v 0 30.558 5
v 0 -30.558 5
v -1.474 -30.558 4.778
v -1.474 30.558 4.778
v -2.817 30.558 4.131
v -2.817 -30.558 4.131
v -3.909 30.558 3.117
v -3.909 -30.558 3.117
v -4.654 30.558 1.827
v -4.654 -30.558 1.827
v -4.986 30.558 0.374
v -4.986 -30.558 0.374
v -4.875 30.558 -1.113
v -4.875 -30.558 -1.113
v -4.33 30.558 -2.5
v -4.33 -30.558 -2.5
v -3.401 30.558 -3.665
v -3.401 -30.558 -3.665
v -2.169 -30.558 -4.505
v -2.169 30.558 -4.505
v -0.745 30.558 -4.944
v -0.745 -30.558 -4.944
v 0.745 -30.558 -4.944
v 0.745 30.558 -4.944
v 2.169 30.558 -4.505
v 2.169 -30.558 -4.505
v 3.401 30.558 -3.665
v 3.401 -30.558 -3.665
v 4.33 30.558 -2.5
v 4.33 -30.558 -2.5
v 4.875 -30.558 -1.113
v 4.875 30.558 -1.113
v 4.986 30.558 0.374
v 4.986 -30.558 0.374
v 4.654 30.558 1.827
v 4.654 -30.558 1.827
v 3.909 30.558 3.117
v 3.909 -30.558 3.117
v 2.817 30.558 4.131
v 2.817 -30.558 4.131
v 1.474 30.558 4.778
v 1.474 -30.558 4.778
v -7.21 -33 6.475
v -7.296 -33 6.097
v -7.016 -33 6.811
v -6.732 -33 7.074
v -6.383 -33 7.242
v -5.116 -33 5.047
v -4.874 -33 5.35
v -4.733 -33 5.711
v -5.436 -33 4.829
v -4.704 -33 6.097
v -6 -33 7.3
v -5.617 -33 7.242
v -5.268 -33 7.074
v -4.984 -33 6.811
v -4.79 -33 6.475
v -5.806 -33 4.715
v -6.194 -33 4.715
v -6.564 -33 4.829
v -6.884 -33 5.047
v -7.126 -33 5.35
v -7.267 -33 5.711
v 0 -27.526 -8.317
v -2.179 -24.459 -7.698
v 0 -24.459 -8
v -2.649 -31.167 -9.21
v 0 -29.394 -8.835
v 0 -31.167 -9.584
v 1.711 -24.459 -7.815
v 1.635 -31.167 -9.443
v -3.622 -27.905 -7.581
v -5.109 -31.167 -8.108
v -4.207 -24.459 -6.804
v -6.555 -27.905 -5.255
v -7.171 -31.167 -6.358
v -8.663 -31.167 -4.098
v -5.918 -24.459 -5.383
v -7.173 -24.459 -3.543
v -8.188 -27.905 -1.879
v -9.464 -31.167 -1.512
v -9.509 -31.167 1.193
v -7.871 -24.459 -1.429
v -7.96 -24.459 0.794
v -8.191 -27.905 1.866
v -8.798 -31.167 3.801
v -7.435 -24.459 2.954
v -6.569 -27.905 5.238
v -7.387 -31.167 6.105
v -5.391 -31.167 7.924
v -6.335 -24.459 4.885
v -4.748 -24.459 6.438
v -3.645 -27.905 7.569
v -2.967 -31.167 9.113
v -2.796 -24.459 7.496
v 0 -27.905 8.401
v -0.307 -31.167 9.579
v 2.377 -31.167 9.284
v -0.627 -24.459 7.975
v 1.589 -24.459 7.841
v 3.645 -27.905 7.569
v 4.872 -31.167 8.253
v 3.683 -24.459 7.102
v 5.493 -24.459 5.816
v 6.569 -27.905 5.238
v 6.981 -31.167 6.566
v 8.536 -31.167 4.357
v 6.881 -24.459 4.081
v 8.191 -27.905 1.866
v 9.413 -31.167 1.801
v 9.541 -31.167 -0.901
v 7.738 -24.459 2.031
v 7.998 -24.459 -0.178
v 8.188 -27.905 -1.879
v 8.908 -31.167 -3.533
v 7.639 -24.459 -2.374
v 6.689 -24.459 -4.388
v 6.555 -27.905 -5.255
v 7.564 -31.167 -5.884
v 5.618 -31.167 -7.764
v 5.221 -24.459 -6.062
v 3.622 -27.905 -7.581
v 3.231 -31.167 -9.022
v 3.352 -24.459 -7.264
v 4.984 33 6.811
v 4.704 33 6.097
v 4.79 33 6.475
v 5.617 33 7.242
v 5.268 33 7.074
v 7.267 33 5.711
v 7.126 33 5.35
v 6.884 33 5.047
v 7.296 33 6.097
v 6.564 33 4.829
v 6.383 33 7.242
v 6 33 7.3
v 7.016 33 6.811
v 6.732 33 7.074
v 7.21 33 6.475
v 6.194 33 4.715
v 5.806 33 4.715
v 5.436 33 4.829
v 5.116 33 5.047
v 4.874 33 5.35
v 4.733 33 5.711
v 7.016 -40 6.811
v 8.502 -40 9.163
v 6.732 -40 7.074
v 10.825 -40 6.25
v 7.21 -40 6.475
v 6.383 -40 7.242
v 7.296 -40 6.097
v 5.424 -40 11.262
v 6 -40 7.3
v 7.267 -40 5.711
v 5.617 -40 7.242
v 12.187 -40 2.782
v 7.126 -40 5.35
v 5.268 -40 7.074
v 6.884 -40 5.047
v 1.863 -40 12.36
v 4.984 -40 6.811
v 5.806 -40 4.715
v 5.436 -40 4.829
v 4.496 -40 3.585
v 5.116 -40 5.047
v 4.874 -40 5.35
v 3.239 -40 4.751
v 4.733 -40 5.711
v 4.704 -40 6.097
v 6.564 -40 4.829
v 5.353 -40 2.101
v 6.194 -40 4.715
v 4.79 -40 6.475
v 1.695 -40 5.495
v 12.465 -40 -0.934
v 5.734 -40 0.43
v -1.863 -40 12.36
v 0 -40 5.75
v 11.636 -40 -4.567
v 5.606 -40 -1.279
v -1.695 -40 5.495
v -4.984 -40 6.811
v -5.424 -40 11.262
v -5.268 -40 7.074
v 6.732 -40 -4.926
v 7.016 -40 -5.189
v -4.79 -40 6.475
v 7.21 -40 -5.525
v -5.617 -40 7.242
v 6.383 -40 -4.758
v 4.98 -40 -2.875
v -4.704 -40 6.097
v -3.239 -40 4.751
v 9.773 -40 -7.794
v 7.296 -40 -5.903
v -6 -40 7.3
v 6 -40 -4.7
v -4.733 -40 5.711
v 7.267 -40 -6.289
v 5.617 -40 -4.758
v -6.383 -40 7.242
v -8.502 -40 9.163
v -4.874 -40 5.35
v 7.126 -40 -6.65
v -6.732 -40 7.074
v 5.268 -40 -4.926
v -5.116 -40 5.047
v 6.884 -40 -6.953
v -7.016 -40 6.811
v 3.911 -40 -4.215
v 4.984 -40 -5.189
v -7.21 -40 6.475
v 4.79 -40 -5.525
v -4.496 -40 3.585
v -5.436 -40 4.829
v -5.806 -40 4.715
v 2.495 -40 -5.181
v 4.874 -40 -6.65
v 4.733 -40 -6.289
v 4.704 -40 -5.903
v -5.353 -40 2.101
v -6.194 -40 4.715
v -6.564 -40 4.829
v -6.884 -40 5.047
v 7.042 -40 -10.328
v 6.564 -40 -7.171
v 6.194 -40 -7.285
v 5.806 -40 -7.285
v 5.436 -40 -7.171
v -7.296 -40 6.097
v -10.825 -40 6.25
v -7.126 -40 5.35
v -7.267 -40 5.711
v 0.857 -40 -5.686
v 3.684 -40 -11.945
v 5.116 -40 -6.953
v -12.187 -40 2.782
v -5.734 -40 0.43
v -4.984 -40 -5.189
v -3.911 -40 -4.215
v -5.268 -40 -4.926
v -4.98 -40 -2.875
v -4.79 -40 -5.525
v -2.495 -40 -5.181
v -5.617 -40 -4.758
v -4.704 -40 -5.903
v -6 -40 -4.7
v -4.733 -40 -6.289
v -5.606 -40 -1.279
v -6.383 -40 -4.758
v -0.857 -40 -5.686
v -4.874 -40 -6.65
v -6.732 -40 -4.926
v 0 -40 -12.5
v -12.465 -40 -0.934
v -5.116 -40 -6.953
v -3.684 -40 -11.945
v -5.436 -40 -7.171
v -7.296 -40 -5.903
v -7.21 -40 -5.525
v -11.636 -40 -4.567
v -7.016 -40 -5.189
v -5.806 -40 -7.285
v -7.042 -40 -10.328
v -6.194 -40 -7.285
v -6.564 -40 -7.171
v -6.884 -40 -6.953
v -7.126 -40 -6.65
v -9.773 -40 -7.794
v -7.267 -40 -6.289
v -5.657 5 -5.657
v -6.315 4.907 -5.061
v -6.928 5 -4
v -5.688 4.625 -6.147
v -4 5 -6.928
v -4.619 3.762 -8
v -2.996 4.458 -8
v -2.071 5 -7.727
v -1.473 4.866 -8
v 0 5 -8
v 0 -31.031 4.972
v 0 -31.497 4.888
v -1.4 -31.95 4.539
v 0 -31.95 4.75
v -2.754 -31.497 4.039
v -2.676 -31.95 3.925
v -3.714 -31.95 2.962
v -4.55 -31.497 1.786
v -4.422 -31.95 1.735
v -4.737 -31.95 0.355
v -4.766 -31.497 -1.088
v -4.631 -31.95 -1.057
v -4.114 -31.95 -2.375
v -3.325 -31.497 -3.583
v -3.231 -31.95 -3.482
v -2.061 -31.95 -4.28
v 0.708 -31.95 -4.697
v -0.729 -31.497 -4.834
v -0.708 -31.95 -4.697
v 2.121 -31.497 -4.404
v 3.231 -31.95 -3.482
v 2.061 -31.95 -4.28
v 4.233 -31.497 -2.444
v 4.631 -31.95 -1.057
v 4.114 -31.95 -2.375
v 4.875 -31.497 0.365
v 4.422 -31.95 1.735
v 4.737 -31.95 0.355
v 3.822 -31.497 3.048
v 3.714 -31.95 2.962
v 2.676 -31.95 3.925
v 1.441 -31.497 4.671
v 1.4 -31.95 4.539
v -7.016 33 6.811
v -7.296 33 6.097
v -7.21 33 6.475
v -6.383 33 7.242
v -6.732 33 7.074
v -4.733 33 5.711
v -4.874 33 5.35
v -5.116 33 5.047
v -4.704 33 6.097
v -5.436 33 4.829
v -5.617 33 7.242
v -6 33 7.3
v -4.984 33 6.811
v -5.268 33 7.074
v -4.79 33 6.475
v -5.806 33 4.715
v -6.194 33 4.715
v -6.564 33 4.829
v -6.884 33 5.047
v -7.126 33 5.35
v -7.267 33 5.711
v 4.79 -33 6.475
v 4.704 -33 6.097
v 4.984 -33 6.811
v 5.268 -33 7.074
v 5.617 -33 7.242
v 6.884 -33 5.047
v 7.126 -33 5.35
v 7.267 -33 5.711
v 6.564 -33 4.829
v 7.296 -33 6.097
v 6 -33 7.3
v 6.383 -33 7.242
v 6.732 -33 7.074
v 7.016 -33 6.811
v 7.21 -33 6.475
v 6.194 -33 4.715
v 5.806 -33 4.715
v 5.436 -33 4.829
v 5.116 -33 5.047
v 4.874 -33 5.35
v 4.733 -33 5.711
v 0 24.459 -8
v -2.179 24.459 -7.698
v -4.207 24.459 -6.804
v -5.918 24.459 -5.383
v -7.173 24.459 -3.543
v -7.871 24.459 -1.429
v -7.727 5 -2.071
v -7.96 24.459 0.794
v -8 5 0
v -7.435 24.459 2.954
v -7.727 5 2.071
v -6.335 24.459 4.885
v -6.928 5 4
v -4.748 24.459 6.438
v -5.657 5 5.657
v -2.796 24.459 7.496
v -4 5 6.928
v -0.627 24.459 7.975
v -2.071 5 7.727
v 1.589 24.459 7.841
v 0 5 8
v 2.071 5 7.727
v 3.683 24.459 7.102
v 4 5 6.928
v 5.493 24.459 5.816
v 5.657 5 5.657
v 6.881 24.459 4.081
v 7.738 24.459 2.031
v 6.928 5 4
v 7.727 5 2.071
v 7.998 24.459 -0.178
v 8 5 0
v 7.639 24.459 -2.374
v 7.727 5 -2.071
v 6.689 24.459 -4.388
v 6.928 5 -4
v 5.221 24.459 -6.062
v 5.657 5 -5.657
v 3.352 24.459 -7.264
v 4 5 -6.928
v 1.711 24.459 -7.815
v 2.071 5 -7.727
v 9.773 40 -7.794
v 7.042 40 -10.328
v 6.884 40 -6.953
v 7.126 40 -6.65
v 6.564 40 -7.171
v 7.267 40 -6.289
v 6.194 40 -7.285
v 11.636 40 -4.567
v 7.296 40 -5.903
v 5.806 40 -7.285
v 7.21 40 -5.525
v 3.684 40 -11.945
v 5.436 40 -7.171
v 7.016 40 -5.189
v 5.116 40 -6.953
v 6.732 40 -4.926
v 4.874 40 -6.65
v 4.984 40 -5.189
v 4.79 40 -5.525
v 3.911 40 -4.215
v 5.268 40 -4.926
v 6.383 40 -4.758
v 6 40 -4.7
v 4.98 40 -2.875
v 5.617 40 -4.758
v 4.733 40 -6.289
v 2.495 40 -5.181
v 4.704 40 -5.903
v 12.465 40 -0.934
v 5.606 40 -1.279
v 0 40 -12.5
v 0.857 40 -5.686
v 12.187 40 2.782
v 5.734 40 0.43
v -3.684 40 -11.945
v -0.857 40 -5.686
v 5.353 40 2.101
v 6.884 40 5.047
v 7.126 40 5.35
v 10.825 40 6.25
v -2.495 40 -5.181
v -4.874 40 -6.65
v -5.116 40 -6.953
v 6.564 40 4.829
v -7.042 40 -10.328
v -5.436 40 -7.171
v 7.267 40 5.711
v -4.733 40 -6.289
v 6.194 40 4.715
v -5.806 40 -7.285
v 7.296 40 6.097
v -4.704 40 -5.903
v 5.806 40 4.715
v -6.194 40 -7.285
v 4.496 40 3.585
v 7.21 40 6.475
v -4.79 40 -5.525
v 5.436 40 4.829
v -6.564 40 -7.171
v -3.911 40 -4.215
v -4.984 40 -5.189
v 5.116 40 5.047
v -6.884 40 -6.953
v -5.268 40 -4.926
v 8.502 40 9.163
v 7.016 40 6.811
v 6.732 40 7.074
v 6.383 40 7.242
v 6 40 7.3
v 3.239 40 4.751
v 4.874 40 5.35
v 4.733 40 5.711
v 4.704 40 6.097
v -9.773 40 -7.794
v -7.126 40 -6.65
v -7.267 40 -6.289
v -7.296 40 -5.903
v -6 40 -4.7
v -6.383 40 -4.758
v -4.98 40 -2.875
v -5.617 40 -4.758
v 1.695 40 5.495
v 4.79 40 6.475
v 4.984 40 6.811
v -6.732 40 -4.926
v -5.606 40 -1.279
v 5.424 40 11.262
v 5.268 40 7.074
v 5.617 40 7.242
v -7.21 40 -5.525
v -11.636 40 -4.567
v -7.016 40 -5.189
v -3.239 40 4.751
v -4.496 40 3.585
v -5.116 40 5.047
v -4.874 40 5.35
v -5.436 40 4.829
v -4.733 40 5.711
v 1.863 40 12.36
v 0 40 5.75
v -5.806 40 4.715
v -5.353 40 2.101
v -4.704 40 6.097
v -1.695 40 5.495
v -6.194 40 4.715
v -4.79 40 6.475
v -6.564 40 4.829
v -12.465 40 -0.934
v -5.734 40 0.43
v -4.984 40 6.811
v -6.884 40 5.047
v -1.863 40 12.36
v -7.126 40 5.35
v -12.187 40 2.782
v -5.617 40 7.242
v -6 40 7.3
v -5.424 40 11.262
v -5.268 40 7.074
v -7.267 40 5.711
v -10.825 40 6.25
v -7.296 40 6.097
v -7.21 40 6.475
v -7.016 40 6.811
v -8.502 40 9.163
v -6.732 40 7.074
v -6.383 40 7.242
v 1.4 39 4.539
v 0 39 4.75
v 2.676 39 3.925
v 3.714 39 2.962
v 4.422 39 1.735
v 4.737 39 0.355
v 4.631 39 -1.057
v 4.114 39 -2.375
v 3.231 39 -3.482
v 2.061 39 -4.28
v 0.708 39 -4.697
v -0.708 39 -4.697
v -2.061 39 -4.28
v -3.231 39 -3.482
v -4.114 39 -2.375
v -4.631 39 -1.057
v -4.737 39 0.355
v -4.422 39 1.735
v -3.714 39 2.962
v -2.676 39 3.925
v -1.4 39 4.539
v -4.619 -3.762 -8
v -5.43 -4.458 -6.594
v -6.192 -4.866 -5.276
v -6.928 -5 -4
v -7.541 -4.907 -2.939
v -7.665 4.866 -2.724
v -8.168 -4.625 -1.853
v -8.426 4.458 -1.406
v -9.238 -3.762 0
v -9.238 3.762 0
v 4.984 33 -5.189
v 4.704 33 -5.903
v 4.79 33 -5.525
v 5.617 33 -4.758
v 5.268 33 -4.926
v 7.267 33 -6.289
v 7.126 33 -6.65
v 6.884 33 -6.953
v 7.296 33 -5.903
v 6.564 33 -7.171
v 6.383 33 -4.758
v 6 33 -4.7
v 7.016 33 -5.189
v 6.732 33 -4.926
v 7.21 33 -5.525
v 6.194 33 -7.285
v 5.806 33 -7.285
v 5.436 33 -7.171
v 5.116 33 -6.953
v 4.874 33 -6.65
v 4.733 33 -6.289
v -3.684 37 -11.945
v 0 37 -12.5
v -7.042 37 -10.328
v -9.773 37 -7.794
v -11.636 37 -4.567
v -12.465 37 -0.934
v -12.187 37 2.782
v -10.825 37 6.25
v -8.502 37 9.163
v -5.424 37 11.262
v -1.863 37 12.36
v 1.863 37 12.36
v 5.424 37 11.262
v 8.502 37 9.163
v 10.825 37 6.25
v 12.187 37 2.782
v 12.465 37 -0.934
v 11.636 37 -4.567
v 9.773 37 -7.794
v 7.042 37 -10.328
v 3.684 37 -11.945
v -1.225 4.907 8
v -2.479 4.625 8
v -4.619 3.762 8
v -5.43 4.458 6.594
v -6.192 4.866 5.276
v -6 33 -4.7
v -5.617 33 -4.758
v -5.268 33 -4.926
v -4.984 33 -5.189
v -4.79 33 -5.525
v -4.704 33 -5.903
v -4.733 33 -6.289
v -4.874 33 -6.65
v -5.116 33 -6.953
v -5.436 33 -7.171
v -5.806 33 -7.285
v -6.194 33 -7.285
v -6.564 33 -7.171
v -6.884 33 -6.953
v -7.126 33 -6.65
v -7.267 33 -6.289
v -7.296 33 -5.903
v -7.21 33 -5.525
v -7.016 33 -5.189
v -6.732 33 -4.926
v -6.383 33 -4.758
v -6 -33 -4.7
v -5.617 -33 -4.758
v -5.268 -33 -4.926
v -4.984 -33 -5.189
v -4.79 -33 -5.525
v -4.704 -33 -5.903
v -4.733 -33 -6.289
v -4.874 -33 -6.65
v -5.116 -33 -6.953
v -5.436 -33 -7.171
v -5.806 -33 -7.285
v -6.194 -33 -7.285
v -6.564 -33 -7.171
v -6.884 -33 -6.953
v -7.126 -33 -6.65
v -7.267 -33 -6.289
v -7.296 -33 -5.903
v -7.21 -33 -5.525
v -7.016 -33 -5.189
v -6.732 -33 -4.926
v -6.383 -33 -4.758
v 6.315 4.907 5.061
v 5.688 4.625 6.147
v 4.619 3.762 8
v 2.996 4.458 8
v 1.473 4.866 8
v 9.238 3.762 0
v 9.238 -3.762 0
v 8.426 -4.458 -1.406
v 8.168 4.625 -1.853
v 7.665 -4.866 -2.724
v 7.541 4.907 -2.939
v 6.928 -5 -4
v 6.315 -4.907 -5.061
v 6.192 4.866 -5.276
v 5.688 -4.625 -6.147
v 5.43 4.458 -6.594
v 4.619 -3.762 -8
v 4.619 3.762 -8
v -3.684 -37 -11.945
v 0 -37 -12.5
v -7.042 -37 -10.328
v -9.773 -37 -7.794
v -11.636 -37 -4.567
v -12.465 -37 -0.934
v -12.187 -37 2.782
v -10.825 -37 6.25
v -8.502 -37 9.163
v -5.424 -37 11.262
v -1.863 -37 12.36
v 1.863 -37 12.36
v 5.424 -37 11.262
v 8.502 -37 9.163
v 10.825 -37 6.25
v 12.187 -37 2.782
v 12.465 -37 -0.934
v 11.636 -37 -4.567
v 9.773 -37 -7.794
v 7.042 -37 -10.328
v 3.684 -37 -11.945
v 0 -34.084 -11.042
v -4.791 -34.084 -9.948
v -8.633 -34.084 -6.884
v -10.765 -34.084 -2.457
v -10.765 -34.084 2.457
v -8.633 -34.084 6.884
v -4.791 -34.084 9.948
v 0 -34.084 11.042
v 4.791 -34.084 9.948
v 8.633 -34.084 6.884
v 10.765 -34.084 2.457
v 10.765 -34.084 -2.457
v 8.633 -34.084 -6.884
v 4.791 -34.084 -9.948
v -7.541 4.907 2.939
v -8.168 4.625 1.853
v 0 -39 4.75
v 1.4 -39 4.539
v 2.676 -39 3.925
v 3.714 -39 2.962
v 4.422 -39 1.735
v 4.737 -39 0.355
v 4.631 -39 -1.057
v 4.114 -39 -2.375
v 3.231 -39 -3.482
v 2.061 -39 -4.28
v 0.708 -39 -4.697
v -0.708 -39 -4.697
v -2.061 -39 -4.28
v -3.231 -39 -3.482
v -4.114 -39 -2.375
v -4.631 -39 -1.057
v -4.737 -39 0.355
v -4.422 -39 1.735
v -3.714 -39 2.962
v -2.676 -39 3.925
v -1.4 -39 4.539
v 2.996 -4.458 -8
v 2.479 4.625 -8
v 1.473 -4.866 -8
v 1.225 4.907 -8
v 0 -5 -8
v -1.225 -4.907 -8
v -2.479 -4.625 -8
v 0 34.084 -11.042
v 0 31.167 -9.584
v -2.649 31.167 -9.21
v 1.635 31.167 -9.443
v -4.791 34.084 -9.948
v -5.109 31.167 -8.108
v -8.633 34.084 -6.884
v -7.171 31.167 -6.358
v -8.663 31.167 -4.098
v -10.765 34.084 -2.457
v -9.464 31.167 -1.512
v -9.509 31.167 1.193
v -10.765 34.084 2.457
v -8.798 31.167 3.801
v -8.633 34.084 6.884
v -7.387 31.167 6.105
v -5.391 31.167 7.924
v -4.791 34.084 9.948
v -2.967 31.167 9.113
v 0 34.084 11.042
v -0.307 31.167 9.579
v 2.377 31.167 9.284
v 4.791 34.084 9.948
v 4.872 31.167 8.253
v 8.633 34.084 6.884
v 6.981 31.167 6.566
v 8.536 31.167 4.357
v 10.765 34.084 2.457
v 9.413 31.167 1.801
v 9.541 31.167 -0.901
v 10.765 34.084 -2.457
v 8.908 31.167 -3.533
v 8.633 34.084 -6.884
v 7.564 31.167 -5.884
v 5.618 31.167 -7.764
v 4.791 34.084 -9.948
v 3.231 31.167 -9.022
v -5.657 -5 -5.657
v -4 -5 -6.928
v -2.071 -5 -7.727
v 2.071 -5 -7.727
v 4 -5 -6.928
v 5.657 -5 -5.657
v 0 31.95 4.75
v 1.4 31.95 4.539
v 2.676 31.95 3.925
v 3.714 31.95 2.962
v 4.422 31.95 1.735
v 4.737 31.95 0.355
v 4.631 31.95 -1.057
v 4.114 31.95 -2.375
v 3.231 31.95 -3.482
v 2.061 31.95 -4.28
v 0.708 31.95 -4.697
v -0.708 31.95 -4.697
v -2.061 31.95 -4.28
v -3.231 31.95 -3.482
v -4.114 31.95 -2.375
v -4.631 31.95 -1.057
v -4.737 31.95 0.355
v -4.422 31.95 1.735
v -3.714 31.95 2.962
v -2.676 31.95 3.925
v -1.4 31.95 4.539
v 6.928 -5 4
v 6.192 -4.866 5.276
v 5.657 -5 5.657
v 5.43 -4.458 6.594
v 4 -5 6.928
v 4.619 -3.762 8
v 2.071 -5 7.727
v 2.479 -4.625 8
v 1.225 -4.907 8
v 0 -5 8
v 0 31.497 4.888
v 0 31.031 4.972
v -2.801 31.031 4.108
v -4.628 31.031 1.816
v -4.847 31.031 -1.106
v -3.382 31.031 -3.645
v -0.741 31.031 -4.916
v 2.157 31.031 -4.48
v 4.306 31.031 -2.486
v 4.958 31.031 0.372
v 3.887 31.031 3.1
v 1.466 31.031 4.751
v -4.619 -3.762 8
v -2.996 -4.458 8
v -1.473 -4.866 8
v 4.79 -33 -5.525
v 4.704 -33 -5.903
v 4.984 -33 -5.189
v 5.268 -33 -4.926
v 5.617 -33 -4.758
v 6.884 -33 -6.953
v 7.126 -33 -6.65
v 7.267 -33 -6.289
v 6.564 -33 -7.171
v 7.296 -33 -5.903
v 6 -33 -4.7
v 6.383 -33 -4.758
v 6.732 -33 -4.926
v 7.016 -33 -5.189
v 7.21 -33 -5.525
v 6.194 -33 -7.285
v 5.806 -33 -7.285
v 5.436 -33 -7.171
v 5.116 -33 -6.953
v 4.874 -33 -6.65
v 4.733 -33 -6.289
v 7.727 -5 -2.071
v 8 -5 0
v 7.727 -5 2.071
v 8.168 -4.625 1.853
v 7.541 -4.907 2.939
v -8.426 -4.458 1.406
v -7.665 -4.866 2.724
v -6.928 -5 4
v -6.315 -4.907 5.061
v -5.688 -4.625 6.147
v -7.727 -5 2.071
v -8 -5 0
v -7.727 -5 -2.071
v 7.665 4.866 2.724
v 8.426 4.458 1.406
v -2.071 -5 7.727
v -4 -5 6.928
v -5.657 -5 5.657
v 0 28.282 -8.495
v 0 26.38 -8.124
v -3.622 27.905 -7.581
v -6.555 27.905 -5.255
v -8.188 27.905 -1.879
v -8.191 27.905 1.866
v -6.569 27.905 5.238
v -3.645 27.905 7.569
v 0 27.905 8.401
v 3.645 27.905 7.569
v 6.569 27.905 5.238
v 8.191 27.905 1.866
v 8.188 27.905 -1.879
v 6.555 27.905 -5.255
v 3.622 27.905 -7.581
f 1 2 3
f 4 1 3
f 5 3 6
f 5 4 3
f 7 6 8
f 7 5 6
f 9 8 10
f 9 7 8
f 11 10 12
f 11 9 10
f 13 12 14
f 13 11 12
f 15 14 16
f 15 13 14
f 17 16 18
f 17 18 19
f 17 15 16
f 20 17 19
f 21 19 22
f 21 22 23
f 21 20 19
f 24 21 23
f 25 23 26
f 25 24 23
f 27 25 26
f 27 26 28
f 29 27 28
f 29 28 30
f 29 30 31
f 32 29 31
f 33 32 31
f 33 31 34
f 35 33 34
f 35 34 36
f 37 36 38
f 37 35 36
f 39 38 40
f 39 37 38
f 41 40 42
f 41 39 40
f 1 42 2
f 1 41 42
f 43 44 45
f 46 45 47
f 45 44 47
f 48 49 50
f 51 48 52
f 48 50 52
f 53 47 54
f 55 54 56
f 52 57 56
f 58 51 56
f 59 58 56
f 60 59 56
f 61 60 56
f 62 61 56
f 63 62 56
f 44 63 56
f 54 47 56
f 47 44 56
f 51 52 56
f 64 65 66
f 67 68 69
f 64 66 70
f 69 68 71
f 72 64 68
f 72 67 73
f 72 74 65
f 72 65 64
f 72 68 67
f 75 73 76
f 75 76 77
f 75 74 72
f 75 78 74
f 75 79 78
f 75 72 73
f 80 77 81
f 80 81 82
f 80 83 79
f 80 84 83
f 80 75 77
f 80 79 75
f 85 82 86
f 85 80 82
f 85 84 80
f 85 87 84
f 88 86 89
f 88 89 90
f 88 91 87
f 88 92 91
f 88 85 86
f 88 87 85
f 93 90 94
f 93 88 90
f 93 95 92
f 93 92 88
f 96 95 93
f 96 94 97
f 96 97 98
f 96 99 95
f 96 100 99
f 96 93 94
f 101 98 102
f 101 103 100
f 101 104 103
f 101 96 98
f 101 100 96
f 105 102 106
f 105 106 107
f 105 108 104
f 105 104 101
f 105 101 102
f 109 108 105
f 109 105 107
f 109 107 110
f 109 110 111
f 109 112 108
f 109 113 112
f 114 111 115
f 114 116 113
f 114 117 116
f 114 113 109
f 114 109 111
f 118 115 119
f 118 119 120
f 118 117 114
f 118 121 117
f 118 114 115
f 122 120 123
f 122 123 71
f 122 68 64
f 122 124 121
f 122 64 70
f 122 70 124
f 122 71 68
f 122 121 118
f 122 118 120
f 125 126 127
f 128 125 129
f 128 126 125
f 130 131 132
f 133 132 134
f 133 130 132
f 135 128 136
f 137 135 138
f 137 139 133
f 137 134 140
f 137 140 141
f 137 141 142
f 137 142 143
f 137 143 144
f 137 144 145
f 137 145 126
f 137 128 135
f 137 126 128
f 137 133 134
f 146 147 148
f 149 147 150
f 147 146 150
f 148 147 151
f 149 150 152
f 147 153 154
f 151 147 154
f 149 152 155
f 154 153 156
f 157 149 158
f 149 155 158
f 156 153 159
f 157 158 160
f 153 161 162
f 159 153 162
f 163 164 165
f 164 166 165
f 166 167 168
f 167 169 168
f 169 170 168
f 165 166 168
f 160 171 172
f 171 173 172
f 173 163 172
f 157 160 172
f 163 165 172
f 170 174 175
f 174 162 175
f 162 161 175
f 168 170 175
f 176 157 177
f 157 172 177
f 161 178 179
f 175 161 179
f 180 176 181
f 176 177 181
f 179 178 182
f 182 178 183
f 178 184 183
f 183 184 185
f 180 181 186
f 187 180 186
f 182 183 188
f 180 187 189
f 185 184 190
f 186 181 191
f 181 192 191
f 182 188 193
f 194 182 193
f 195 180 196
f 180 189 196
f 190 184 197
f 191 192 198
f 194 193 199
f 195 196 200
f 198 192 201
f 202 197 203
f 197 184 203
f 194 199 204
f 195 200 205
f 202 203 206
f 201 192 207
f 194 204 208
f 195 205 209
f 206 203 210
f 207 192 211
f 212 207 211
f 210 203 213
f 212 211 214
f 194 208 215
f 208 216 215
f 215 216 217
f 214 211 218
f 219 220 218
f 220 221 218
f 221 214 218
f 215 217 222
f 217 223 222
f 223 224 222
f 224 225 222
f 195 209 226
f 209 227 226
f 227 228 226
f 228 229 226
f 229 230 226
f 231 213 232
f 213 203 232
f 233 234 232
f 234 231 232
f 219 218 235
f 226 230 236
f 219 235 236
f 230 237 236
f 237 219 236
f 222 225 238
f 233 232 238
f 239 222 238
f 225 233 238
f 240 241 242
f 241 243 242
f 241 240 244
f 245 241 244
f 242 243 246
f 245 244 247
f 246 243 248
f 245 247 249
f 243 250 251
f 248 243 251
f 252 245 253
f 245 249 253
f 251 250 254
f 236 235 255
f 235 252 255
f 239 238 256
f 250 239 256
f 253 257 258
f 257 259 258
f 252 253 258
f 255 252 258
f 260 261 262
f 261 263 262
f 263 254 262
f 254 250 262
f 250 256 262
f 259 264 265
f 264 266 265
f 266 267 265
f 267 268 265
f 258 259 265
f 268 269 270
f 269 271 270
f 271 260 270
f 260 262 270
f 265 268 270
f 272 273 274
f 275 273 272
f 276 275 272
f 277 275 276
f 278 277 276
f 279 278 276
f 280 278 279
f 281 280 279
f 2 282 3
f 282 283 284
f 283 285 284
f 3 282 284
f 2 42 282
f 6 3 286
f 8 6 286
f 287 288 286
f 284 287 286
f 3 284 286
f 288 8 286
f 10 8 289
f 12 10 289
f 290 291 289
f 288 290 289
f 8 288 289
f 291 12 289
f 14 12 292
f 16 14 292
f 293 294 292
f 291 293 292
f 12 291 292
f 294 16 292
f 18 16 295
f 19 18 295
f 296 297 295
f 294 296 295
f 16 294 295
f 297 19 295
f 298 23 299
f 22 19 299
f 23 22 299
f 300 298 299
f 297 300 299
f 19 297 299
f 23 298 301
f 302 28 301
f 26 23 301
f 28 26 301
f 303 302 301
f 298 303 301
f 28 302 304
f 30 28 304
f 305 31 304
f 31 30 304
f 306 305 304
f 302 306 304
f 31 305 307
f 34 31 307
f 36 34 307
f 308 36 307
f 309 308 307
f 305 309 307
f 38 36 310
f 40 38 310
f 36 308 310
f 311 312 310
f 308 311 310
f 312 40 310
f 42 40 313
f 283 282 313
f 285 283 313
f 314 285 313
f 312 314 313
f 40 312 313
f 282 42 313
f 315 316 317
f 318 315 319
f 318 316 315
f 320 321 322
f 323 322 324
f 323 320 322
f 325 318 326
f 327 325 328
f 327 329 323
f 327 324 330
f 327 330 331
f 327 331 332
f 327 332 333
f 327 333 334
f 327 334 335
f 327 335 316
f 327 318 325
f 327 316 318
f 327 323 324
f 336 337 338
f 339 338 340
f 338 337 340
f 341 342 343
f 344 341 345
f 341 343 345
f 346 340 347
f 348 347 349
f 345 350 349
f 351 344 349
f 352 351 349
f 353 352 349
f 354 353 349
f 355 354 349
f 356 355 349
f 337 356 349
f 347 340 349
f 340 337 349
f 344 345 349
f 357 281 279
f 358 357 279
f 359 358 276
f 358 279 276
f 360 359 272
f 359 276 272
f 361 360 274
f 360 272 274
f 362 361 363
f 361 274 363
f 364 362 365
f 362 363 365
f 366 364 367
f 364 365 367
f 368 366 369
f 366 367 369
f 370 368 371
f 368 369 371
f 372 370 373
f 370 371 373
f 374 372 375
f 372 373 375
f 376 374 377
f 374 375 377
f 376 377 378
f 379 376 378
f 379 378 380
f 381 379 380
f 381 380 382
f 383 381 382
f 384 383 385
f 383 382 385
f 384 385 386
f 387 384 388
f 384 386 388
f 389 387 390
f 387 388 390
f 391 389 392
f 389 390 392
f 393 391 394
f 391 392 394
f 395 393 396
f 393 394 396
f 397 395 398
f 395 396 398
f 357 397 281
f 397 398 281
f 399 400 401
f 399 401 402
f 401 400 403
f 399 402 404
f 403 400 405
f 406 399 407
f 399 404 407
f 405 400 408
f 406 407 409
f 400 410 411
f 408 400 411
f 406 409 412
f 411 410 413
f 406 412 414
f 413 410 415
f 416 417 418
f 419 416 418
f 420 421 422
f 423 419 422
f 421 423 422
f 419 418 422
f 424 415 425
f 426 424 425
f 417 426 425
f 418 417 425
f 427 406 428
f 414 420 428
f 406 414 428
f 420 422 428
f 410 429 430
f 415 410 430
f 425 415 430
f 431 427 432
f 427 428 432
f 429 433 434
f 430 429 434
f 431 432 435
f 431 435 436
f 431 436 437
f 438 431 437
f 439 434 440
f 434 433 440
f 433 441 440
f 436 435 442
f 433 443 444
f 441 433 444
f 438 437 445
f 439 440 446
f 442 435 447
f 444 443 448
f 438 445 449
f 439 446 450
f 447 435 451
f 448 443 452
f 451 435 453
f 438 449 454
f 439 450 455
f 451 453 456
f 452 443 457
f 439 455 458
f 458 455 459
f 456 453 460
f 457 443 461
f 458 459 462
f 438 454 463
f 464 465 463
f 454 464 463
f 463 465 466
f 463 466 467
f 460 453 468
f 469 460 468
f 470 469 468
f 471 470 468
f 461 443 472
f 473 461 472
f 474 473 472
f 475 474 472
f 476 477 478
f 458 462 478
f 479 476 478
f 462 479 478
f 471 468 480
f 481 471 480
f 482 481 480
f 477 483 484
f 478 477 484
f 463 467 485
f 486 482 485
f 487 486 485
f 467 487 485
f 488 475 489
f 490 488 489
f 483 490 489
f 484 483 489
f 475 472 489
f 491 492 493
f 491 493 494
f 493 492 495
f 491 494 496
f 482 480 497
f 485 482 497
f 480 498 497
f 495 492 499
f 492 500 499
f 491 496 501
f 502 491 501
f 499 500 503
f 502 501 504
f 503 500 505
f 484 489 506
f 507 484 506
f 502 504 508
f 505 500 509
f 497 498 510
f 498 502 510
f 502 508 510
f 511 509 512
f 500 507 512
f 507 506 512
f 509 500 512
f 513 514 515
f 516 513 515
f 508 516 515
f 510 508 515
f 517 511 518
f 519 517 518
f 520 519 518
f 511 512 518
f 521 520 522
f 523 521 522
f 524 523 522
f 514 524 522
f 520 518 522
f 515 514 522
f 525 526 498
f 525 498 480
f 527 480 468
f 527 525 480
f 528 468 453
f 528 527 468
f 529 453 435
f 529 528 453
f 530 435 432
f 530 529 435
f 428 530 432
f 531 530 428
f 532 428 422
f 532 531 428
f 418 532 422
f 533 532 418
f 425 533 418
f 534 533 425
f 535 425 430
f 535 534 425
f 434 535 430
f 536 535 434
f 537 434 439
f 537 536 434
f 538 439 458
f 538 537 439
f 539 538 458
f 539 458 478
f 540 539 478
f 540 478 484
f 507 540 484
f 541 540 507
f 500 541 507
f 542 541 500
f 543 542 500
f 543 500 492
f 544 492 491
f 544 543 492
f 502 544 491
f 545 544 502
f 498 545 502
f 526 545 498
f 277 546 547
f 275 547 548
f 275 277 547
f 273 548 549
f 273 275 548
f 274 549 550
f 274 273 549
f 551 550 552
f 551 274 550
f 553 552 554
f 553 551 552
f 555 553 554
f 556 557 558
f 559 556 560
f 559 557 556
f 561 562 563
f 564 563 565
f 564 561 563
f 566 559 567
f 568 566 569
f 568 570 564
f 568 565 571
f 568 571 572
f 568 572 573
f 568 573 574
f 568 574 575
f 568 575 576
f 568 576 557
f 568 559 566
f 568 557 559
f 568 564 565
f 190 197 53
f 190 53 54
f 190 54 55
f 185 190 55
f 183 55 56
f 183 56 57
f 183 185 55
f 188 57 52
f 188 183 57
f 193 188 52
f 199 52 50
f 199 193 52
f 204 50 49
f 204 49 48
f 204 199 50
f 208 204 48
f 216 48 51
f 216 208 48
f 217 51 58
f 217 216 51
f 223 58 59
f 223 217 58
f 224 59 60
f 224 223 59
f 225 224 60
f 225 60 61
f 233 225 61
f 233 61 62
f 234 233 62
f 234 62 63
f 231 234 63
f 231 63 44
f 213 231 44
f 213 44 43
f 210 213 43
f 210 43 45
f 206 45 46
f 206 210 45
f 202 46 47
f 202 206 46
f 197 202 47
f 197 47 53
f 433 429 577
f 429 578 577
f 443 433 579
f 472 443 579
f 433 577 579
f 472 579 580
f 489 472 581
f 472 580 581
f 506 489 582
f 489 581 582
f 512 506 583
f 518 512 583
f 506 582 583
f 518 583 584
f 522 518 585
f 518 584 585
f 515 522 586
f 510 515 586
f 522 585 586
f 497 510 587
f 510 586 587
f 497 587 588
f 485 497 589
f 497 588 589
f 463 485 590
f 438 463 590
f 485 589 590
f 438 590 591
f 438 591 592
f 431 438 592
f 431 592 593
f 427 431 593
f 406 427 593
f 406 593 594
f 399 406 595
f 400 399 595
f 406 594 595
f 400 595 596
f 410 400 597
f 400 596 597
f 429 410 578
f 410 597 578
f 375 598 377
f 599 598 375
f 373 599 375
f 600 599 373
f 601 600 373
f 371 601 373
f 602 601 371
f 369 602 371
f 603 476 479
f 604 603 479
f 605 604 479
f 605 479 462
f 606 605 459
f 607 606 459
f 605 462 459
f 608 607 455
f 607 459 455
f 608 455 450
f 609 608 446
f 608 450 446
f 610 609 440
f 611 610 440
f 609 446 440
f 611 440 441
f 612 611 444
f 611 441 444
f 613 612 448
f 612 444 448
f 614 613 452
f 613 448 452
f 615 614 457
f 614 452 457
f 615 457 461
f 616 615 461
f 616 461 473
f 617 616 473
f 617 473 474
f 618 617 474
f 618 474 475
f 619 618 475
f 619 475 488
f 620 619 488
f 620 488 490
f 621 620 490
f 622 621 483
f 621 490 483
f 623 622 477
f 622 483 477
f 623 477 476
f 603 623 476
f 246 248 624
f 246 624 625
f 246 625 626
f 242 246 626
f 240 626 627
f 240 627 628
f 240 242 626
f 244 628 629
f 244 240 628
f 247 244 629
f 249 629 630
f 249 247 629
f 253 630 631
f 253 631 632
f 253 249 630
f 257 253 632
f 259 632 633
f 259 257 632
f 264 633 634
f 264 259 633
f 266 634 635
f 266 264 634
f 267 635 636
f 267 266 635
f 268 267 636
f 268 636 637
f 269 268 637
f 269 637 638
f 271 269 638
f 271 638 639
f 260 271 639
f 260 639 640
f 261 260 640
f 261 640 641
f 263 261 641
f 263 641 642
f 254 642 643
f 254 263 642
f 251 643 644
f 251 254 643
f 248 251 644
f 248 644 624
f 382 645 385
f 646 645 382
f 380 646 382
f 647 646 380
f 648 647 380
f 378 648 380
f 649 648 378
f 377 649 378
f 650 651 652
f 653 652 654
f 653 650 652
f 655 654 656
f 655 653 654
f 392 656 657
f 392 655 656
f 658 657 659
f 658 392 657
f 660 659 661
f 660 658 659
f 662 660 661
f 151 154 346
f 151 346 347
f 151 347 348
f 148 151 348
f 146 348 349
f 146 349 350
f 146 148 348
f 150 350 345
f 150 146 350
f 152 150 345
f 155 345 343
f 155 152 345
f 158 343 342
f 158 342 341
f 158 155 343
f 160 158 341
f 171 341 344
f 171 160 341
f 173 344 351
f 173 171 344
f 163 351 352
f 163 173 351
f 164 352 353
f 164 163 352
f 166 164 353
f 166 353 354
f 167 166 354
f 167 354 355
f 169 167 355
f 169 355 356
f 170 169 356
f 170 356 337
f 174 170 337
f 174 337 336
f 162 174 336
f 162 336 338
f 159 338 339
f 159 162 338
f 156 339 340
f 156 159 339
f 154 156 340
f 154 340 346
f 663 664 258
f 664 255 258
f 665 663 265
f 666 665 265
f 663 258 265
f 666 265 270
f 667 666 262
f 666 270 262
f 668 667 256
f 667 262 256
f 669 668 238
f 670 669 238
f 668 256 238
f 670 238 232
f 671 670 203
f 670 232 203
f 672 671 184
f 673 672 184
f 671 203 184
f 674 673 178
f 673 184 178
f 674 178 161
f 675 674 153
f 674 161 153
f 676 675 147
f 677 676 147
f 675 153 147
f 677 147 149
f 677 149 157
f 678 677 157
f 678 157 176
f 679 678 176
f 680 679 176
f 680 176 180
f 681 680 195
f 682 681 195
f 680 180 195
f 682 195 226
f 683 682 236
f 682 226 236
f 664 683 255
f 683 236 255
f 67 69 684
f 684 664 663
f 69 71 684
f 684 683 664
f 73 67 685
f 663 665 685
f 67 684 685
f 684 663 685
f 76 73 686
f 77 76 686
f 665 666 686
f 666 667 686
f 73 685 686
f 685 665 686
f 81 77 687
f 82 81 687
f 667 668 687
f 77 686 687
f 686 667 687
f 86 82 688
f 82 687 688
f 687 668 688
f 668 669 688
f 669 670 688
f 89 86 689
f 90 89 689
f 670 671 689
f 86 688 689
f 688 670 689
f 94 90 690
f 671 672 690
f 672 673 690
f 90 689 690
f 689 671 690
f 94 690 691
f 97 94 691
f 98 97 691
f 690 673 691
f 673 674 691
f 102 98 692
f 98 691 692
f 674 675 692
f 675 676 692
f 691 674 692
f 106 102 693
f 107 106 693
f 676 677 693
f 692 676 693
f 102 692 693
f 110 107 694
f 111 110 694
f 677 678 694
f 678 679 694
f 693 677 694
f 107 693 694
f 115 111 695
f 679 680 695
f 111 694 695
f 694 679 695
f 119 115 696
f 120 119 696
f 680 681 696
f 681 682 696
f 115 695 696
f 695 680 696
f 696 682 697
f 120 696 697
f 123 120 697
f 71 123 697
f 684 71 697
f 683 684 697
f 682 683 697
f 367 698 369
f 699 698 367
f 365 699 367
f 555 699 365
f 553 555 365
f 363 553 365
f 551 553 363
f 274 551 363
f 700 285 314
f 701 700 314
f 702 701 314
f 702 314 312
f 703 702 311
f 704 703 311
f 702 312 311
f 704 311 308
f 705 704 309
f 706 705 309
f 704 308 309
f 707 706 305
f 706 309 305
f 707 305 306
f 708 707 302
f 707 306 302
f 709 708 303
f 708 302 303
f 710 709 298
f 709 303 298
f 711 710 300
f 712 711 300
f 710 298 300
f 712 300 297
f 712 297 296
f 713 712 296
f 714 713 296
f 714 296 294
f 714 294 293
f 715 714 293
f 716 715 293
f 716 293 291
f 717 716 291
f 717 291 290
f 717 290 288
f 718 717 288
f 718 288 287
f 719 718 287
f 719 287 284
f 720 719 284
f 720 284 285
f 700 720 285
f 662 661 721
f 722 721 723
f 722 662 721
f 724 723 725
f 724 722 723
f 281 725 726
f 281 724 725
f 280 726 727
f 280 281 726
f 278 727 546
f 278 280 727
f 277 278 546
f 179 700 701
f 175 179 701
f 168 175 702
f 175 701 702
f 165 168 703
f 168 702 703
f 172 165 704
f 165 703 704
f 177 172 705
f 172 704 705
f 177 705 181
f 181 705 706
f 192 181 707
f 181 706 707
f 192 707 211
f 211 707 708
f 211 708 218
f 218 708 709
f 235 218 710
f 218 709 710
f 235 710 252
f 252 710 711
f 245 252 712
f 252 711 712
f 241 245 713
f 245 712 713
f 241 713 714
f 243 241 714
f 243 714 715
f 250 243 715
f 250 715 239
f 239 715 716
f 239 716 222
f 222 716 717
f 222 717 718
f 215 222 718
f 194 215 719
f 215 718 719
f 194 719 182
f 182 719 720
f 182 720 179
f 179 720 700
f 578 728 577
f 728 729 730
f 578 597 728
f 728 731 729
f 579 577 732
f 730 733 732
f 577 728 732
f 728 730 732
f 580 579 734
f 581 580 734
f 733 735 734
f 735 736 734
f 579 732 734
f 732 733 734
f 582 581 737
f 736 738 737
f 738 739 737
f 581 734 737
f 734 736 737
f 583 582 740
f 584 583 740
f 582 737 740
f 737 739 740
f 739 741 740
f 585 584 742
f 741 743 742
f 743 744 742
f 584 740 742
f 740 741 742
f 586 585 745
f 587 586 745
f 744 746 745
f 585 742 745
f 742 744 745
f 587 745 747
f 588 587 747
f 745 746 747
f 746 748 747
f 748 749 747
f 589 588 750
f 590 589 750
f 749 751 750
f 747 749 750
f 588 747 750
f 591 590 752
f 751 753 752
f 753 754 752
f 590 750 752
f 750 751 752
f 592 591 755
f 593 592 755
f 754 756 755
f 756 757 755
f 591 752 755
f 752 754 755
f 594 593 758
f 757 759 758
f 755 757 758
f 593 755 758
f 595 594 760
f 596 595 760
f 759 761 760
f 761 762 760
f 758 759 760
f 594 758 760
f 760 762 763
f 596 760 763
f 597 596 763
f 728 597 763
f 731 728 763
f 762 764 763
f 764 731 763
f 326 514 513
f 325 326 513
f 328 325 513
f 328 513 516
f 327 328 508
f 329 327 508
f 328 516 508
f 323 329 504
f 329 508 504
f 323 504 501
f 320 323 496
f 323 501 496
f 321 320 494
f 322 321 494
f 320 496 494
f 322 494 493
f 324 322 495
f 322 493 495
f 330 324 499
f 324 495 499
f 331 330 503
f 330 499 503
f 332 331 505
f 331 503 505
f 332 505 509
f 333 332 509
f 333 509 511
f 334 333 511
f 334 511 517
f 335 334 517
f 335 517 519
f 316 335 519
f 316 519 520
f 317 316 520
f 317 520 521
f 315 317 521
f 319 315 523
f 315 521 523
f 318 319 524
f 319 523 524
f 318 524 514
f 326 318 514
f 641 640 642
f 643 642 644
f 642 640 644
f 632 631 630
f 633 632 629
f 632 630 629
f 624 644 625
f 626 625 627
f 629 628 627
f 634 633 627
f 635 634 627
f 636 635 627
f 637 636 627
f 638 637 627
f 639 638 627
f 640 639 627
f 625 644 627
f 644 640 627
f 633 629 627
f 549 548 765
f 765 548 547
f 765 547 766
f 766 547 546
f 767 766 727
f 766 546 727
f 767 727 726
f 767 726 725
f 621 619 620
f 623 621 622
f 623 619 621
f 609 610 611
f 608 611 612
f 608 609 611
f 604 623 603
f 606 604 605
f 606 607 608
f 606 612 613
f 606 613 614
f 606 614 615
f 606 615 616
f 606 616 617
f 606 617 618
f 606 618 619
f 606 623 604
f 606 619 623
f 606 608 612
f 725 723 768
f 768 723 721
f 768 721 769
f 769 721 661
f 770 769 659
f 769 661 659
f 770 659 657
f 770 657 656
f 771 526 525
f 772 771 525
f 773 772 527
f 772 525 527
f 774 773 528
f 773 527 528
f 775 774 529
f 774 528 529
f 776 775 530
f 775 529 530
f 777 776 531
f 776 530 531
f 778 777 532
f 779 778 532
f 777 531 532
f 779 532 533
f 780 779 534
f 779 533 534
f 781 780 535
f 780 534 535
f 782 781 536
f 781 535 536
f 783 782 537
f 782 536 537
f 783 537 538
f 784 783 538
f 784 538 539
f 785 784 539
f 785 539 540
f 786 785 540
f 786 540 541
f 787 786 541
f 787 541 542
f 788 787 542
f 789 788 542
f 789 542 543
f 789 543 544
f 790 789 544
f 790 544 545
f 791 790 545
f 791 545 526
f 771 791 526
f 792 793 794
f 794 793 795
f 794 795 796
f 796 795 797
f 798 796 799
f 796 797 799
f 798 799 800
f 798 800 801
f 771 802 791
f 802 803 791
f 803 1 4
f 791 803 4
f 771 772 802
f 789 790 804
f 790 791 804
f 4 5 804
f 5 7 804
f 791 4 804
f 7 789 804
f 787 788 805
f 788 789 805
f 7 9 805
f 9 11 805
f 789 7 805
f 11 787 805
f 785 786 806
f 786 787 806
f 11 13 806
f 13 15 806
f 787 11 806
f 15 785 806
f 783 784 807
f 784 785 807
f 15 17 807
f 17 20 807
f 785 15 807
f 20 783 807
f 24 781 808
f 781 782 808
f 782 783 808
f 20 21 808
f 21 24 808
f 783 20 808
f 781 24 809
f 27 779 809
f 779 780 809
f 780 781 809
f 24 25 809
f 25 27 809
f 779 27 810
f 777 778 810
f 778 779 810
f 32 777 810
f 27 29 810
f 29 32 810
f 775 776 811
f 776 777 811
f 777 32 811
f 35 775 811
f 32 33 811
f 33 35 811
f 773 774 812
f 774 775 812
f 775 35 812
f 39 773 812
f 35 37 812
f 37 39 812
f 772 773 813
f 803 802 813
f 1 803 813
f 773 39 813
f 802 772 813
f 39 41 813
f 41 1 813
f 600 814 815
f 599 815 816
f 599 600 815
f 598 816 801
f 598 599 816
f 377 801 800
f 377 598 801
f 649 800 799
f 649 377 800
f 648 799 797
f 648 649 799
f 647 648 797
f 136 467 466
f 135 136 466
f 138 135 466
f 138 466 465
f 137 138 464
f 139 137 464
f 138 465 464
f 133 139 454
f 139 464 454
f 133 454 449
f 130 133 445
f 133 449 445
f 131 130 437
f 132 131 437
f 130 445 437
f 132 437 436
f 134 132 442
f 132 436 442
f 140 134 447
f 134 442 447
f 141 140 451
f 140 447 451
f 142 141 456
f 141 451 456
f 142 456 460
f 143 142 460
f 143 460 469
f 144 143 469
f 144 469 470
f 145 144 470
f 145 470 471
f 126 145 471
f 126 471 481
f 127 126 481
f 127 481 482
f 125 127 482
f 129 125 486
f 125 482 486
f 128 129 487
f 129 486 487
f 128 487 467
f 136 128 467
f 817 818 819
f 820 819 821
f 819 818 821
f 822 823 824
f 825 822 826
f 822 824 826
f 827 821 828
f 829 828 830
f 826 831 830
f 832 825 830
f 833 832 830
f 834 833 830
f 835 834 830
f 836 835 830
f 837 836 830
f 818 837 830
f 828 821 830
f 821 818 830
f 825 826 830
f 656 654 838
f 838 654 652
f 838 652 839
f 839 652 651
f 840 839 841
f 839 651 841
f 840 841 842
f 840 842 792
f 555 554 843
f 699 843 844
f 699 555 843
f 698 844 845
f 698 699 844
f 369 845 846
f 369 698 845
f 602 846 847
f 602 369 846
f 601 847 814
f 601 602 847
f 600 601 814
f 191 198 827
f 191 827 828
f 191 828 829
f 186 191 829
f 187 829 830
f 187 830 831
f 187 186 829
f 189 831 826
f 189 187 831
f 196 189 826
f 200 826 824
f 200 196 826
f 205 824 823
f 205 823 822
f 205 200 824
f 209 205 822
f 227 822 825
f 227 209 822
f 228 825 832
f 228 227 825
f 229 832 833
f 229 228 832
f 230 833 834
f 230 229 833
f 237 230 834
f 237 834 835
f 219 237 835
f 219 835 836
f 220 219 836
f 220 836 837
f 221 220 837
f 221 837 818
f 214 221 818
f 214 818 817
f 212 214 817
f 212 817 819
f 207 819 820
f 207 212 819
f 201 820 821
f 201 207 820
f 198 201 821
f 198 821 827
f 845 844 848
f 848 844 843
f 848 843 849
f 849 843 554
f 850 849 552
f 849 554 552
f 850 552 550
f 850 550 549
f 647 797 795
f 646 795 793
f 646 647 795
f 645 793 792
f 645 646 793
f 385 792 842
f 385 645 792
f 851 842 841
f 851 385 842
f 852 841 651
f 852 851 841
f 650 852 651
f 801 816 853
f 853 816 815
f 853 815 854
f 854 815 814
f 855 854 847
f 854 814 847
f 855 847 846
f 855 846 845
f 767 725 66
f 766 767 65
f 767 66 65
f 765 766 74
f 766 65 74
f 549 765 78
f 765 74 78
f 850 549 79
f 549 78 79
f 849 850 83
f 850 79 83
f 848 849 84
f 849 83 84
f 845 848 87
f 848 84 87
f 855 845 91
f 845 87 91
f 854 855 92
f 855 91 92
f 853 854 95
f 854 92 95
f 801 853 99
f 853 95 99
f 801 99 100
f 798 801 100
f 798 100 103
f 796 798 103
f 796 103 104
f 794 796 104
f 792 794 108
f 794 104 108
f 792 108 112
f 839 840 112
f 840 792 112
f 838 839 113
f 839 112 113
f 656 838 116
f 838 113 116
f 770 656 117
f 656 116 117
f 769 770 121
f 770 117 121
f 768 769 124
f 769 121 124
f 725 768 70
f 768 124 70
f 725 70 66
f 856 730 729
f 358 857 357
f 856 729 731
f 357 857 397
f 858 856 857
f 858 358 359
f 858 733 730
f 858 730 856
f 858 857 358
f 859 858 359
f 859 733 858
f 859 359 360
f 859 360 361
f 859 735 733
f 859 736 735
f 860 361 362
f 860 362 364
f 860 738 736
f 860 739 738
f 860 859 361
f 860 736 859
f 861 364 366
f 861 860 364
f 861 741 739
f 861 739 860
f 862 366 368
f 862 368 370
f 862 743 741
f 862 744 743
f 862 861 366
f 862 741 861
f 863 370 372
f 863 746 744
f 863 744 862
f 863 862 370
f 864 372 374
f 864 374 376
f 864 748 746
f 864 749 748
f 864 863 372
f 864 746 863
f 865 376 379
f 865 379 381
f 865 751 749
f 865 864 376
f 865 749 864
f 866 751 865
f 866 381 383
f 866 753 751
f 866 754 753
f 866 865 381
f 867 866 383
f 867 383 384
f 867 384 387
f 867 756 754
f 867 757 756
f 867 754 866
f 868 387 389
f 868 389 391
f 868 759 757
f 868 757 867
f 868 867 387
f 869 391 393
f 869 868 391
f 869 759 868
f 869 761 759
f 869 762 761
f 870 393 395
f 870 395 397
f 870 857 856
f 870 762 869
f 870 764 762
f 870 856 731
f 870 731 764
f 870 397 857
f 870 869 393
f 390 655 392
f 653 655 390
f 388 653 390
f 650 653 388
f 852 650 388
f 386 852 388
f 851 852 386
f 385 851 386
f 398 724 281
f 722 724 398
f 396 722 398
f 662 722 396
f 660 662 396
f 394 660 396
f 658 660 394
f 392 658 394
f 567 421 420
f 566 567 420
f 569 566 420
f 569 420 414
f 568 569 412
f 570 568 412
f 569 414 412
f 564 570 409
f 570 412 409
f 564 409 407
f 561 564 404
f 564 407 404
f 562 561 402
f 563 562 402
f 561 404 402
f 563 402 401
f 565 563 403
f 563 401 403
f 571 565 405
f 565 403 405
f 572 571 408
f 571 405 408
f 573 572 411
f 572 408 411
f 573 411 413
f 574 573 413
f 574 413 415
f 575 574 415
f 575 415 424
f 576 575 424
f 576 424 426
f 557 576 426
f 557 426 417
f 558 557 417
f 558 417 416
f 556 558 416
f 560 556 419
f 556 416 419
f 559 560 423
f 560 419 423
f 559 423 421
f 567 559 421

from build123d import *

# Parameters (mm, degrees)
SKETCH2_R           = 1.3
CUT_EXTRUDE1_DEPTH  = 7
SKETCH4_R           = 4.75
CUT_EXTRUDE2_DEPTH  = 82.929848041
FILLET1_R           = 15
FILLET2_R           = 4
SKETCH5_R           = 7
BOSS_EXTRUDE1_DEPTH = 5
CHAMFER1_SIZE       = 1


with BuildPart() as part:
    # Sketch1 → Revolve1 (revolve)
    with BuildSketch(Plane.XY, mode=Mode.PRIVATE) as revolve1_sk:
        Polygon((0, -40), (0, 40), (-12.5, 40), (-12.5, 37), (-8, 28), (-8, -28), (-12.5, -37), (-12.5, -40), align=None)
    revolve(revolve1_sk.sketch.rotate(Axis((0, -40, 0), (0, 1, 0)), 270), axis=Axis((0, -40, 0), (0, 1, 0)))

    # Sketch2 → Cut-Extrude1 (cut)
    with BuildSketch(Plane(origin=(0, 40, 0), x_dir=(1, 0, 0), z_dir=(0, 1, 0))):
        with Locations(Location((-6, 6, 0), (0, 0, 270))):
            Circle(SKETCH2_R)
        with Locations(Location((6, 6, 0), (0, 0, 270))):
            Circle(SKETCH2_R)
        with Locations(Location((-6, -6, 0), (0, 0, 270))):
            Circle(SKETCH2_R)
        with Locations(Location((6, -6, 0), (0, 0, 270))):
            Circle(SKETCH2_R)
    cut_extrude1 = extrude(amount=-CUT_EXTRUDE1_DEPTH, mode=Mode.SUBTRACT)

    # Mirror1: Cut-Extrude1 across plane
    add(cut_extrude1.mirror(Plane.ZX), mode=Mode.SUBTRACT)

    # Sketch3 → Cut-Revolve1 (revolve, cut)
    with BuildSketch(Plane(origin=(0, 0, 0), x_dir=(0, 0, -1), z_dir=(1, 0, 0))):
        Polygon((-5, 31.7), (0, 36.7), (0, -36.7), (-5, -31.7), align=None)
    revolve(axis=Axis((0, 36.7, 0), (0, -1, 0)), mode=Mode.SUBTRACT)

    # Sketch4 → Cut-Extrude2 (cut, through all)
    with BuildSketch(Plane(origin=(0, 40, 0), x_dir=(1, 0, 0), z_dir=(0, 1, 0))):
        with Locations(Location((0, 0, 0), (0, 0, 270))):
            Circle(SKETCH4_R)
    extrude(amount=-CUT_EXTRUDE2_DEPTH, mode=Mode.SUBTRACT)

    # Fillet1
    fillet1_edges = [part.edges().sort_by_distance(p)[0] for p in [
        (0, -28, 8),
        (0, 28, 8),
    ]]
    fillet(fillet1_edges, radius=FILLET1_R)

    # Fillet2
    # the kernel refuses this fillet: 4 mm, written as the material it adds along each edge
    with BuildSketch(Plane(origin=(0, 31.7, 0), x_dir=(0, 0, 1), z_dir=(1, 0, 0))) as fillet2_piece_1:
        with BuildLine():
            CenterArc((1, 1.141941091), FILLET2_R, 339.635865194, 20.364134806)
            Line((5, 1.141941091), (5.08, 1.141941091))
            Line((5.08, 1.141941091), (5.08, 0))
            Line((5.08, 0), (5.056568542, -0.056568542))
            ThreePointArc((5.056568542, -0.056568542), (4.931568542, -0.181568542), (4.825, -0.277838822))
            Line((4.825, -0.277838822), (4.75, -0.25))
        make_face()
    revolve(axis=Axis((0, 31.7, 0), (0, -1, 0)))
    with BuildSketch(Plane(origin=(0, -31.7, 0), x_dir=(0, 0, 1), z_dir=(1, 0, 0))) as fillet2_piece_2:
        with BuildLine():
            CenterArc((1, -1.141941091), FILLET2_R, 0, 20.364134806)
            Line((4.75, 0.25), (4.825, 0.277838822))
            ThreePointArc((4.825, 0.277838822), (4.931568542, 0.181568542), (5.056568542, 0.056568542))
            Line((5.056568542, 0.056568542), (5.08, 0))
            Line((5.08, 0), (5.08, -1.141941091))
            Line((5.08, -1.141941091), (5, -1.141941091))
        make_face()
    revolve(axis=Axis((0, -31.7, 0), (0, -1, 0)))

    # Sketch5 → Boss-Extrude1 (add, symmetric)
    with BuildSketch(Plane(origin=(0, 0, 0), x_dir=(1, 0, 0), z_dir=(0, 1, 0))):
        Polygon((4.618802154, 8), (-4.618802154, 8), (-9.237604307, 0), (-4.618802154, -8), (4.618802154, -8), (9.237604307, 0), align=None)
        Circle(SKETCH5_R, mode=Mode.SUBTRACT)
    extrude(amount=BOSS_EXTRUDE1_DEPTH, both=True)

    # Sketch6 → Cut-Revolve2 (revolve, cut)
    with BuildSketch(Plane.XY, mode=Mode.PRIVATE) as cut_revolve2_sk:
        Polygon((-8, 5), (-9.237604307, 3.762395693), (-9.237604307, 5), align=None)
    cut_revolve2 = revolve(cut_revolve2_sk.sketch.rotate(Axis((0, -40, 0), (0, -1, 0)), 270), axis=Axis((0, -40, 0), (0, -1, 0)), mode=Mode.SUBTRACT)

    # Mirror2: Cut-Revolve2 across plane
    add(cut_revolve2.mirror(Plane.ZX), mode=Mode.SUBTRACT)

    # Chamfer1
    chamfer1_edges = [part.edges().sort_by_distance(p)[0] for p in [
        (0, -40, -4.75),
        (0, 40, -4.75),
    ]]
    chamfer(chamfer1_edges, length=CHAMFER1_SIZE)


solid = part.part
